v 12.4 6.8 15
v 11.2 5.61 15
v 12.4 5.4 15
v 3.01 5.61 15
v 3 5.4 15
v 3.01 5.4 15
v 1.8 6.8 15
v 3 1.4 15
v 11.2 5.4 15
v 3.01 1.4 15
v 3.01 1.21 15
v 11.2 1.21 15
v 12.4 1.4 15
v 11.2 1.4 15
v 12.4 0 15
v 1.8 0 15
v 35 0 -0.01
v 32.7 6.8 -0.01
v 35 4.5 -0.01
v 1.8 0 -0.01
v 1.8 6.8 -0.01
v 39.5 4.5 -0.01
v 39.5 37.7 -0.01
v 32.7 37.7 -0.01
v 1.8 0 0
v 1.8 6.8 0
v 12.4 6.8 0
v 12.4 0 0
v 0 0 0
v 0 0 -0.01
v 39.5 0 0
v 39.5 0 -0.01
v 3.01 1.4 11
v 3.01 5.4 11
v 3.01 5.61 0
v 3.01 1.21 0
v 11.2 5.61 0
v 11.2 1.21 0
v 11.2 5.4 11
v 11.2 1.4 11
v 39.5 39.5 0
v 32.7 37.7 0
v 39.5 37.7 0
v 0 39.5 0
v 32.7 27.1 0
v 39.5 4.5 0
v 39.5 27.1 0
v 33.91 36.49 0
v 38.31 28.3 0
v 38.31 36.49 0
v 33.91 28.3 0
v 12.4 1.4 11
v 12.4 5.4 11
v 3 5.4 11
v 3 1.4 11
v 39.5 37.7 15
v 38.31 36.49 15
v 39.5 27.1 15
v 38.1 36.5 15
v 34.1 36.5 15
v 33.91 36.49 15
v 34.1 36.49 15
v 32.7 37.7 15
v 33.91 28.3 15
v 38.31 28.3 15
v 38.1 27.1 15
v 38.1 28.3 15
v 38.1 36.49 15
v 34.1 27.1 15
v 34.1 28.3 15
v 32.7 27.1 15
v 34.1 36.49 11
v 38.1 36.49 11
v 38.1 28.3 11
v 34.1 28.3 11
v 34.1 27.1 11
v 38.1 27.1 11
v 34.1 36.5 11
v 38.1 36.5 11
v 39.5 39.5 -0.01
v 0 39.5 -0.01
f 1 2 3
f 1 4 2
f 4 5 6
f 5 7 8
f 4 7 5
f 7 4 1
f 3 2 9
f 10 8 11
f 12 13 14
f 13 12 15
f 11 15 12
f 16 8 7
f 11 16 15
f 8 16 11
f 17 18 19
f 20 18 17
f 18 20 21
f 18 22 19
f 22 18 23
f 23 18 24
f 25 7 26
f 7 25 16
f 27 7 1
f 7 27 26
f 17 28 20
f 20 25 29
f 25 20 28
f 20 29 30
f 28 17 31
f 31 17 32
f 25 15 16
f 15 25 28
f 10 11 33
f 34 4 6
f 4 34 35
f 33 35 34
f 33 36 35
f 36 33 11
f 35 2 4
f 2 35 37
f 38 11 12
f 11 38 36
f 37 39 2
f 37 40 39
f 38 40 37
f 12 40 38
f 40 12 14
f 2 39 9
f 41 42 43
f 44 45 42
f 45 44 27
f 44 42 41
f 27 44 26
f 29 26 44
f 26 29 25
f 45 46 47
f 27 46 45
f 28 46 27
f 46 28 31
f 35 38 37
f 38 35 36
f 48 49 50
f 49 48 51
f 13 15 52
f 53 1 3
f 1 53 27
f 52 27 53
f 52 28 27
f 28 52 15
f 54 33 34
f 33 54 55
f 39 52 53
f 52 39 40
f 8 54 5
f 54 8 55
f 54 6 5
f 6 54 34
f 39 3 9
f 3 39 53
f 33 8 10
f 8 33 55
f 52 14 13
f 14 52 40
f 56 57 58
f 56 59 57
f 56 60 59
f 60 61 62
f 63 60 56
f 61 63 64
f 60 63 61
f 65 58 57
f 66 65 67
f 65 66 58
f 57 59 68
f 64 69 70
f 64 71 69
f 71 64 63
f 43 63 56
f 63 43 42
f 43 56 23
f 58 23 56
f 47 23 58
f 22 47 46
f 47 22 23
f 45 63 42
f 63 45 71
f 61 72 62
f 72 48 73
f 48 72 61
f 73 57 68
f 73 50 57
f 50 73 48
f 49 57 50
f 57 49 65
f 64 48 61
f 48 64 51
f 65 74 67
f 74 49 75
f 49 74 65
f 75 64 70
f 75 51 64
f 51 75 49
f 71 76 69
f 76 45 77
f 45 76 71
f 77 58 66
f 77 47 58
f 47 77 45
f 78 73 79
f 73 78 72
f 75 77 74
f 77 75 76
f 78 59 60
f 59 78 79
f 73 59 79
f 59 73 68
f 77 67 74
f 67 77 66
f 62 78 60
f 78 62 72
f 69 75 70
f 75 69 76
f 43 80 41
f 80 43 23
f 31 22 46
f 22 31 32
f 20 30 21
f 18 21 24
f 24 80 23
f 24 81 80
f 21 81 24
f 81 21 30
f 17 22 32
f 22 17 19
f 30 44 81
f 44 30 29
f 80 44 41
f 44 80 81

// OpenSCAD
// file: ../Base/Boxes.scad
// Fischertechnik Box Foundation
// Pre-designed Boxes

use <Constants.scad>

include <PlacementOptions.scad>

box190Width = 190;
box190Depth = 130;
box130Width = 130;
box130Depth = 95;

// Values are from an original ec3 box
topBottomDifference = 1.5;
outerHeight = 40;
innerHeight = 38.2;
baseThickness = outerHeight - innerHeight;
stackExcess = 5.7;
radius = 3.5;
wallThickness = 1.5;
tolerance = 0.2;
stackOffset = innerHeight - stackExcess;

boxUsageHeight = stackOffset;
boxWallThickness = wallThickness;
boxBaseThickness = baseThickness;
boxWebWidth = 3.0;

// getBoxWallThickness()
// Gets the wall thickness of a Fischertechnik Box
function getBoxWallThickness() = boxWallThickness;

// getBoxUsageHeight()
// Gets the usable height of a Fischertechnik box
function getBoxUsageHeight() = boxUsageHeight;

// getBoxInnerHeight()
// Gets the inner height of a Fischertechnik box, including the stack excess
function getBoxInnerHeight() = innerHeight;

// getBoxBaseThickness()
// Gets the thickness of the Fischertechnik box base.
function getBoxBaseThickness() = boxBaseThickness;

// getBoxWebWidth()
// Gets the width of a box web
function getBoxWebWidth() = boxWebWidth;

// getBox190Space()
// Gets the usable inner space of a Box 190 as an x/y-list
function getBox190Space() = [
    box190Width - 2*getBoxWallThickness() - topBottomDifference, 
    box190Depth - 2*getBoxWallThickness() - topBottomDifference ];

// BoxBase(width, depth)
// Creates an empty stackable Fischertechnik compatible box
// width = Outer width of the box (190, 130, ...)
// depth = Outer depth of the box (130, 95, ...)

module BoxBase(width, depth, height=outerHeight) {    
    thinPlate = 0.01;

    innerHeight = height - baseThickness;    
    
    module BodyPlate(width, depth) {
        translate([radius, radius])
        hull() {
            w = width-2*radius;
            d = depth-2*radius;
            cube([w, d, thinPlate]);
            cylinder(thinPlate, r=radius, $fn=getFragments());
            translate([w, 0])
                cylinder(thinPlate, r=radius, $fn=getFragments());
            translate([w, d])
                cylinder(thinPlate, r=radius, $fn=getFragments());
            translate([0, d])
                cylinder(thinPlate, r=radius, $fn=getFragments());
        }
    }
    
    module Body(tolerance=tolerance) {
        hull() {
            // Bottom with tolerance to fit into the original boxes when stacked
            translate([-wallThickness+tolerance, -wallThickness+tolerance, -baseThickness])
                BodyPlate(width-topBottomDifference-2*tolerance, depth-topBottomDifference-2*tolerance);
            
            // Top
            translate([-wallThickness-topBottomDifference/2, -wallThickness-topBottomDifference/2, innerHeight-thinPlate])
                BodyPlate(width, depth);
         }
    }

    module Cutoff() {
        hull() {
            coWidth = width - 2*wallThickness;
            coDepth = depth - 2*wallThickness;
            
            // Bottom
            BodyPlate(coWidth-topBottomDifference, coDepth-topBottomDifference);

            // Top
            translate([-topBottomDifference/2, -topBottomDifference/2, innerHeight+thinPlate]) 
                BodyPlate(coWidth, coDepth);
        }
    }
    
    difference() {        
        Body();
        Cutoff();
        stackOffset = innerHeight - stackExcess;
        translate([0, 0, stackOffset + baseThickness])
            Body(tolerance=0);
    }
}

// Creates the Fischertechnik empty box 130x190 mm and places it at position 0,0
// 190x130 are the outer sizes, the inner space is slightly smaller. Use getBox190Space() to get the inner sizes.
// The box is positioned that the usable inner space is at the 0,0,0 position. The

module Box190() {
    BoxBase(box190Width, box190Depth);
}

// Gets the usable inner space of a Box 130 as an x/y-list
function getBox130Space() = [
    box130Width - 2*getBoxWallThickness() - topBottomDifference, 
    box130Depth - 2*getBoxWallThickness() - topBottomDifference ];

// Creates the Fischertechnik empty box 95x130 mm and places it at position 0,0
// 190x130 are the outer sizes, the inner space is slightly smaller. Use getBox190Space() to get the inner sizes.
// The box is positioned that the usable inner space is at the 0,0,0 position. The

module Box130() {
    BoxBase(box130Width, box130Depth);
}

// Creates a web at the specified box walls
// corner 0 = LowerLeft, 1 = UpperLeft, 2 = UpperRight, 3 = LowerRight
// side 0 = LeftOfCorner, 1 = RightOfCorner
// distance = Distance in mm from the corner
// boxSpace = inner width and depth of the box (default: Box 190)
// webWidth = length of the web (default is 3 mms)
// webThickness = thickness of the web (default is 1 mm)

module BoxWeb(corner, side, distance, boxSpace=getBox190Space(), webWidth=getBoxWebWidth(), webThickness=1.0) {
    sink = getBoxWallThickness()/2;

    width = (corner % 2 == 0) ? 
            (side == LeftOfCorner ? webWidth : webThickness) :
            (side == LeftOfCorner ? webThickness : webWidth);

    depth = (corner % 2 == 0) ? 
            (side == RightOfCorner ? webWidth : webThickness) :
            (side == RightOfCorner ? webThickness : webWidth);
    
    xDiff = corner == LowerLeft ? 
                (side == LeftOfCorner ? -sink : distance) :
            (corner == UpperLeft ?                
                (side == LeftOfCorner ? distance : -sink) :
            (corner == UpperRight ?
                (side == LeftOfCorner ? boxSpace.x-webWidth+sink : boxSpace.x-distance-webThickness) :
                (side == LeftOfCorner ? boxSpace.x-distance-webThickness: boxSpace.x-webWidth+sink)));

    yDiff = corner == LowerLeft ? 
                (side == RightOfCorner ? -sink : distance) :
            (corner == UpperLeft ?
                (side == RightOfCorner ? boxSpace.y-distance : boxSpace.y-webWidth+sink) :
            (corner == UpperRight ?
                (side == RightOfCorner ? boxSpace.y-webWidth+sink : boxSpace.y-distance) :
                (side == RightOfCorner ? distance : -sink)));
    
    translate([xDiff, yDiff, -getExcess()])
        cube([width, depth, boxUsageHeight + 2*getExcess()]);
}
// file: ../Base/Rotation.scad
// Fischertechnik Box Foundation
// Geometry Helpers Rotation

include <PlacementOptions.scad>

// getRotatedSpace(space, rotation=NoRotation)
// Rotates the space dependent on the specified rotation

function getRotatedSpace(space, rotation=NoRotation) = [
    (rotation == Rotate90 || rotation == Rotate270) ? space.y : space.x,
    (rotation == Rotate90 || rotation == Rotate270) ? space.x : space.y
];

// Rotates the given space around the fixed left lower corner
// space = the space the children needs as width/depth list [width,depth]
// rotation = 0 Rotate0 degrees, 1 Rotate90 degrees, 2 Rotate180 degrees, 3 Rotate270 degrees (equivalent to -90)

module RotateFix(space, rotation=NoRotation) {
    dy = (rotation == Rotate0 || rotation == Rotate270) ? 0 :
        (rotation == Rotate90) ? space.x :
        space.y;
    dx = (rotation < Rotate180) ? 0 :
        (rotation == Rotate180) ? space.x :
        space.y;
    
    translate([dx, dy, 0])
        rotate([0, 0, rotations[rotation]])
            children();
}
// file: ../Base/Alignment.scad
// Fischertechnik Box Foundation
// Geometry Helpers Alignment

include <PlacementOptions.scad>

// getAlignedX(elementWidth, spaceWidth, align=AlignRight, offset=0)
// Gets the aligned X offset of an element with the given
// width in the given space.
// elementWidth = The width of the element to positon
// spaceWidth = The space where the element should be aligned
// align = 0 AlignLeft, 1 AlignCenter, 2 AlignRight
// offset = an optional offset from the aligned position. When
// aligned left or centered, then positive values are in X direction.
// When aligned right then positive values are in negative X direction.

function getAlignedX(elementWidth, spaceWidth, align=AlignRight, offset=0) =
    (align == AlignLeft) ?
        offset :
        ((align == AlignCenter) ?
        (spaceWidth - elementWidth)/2 + offset :
        spaceWidth - offset - elementWidth);

// getAlignedY(elementDepth, spaceDepth, align=AlignTop, offset=0)
// Gets the aligned Y offset of an element with the given
// depth in the given space.
// elementDepth = The depth of the element to positon
// spaceDepth = The space where the element should be aligned
// align = 0 AlignBottom, 1 AlignCenter, 2 AlignTop
// offset = an optional offset from the aligned position. When
// aligned bottom or centered, then positive values are in Y direction.
// When aligned top then positive values are in negative Y direction.

function getAlignedY(elementDepth, spaceDepth, align=AlignTop, offset=0) =
    (align == AlignBottom) ?
        offset :
        ((align == AlignCenter) ?
        (spaceDepth - elementDepth)/2 + offset :
        spaceDepth - offset - elementDepth);
// file: ../Base/PlacementOptions.scad
// Fischertechnik Box Foundation
// Placement Options

// Alignment
NoAlign = 0;
AlignLeft = 1;
AlignBottom = 2;
AlignCenter = 3;
AlignRight = 4;
AlignTop = 5;

// Element rotation degree steps
rotations = [0, -90, -180, -270];

// Rotation
NoRotation = 0;
Rotate0 = 0;
Rotate90 = 1;
Rotate180 = 2;
Rotate270 = 3;

// Docking (seen from above)
NoDock = -1;
DockLeft = 0;
DockTop = 1;
DockRight = 2;
DockCorner = 2;
DockBottom = 3;

// Web corners
LowerLeft = 0;
UpperLeft = 1;
UpperRight = 2;
LowerRight = 3;

// Web position relative to corner
LeftOfCorner = 0;
RightOfCorner = 1;
// file: ../Base/Placement.scad
// Fischertechnik Box Foundation
// Geometry Helpers Placement

use <Constants.scad>
use <Alignment.scad>
use <Rotation.scad>
use <Boxes.scad>

include <PlacementOptions.scad>

// Place(x=0, y=0, elementSpace=[0,0], alignX=AlignLeft, alignY=AlignBottom, rotation=Rotate0, boxSpace=getBox190Space())
// Places the child at the specified position
// y = Y-Position. This is a relative position when an X aligment is specified.
// x = X-Position. This is a relative position when an Y aligment is specified.
// elementSpace = space of the element to be placed [x,y]
// alignX = -1=NoAlign, 0 AlignLeft, 1 AlignCenter, 3 AlignRight (elementSpace and boxSpace required!)
// alignY = -1=NoAlign, 2 AlignBottom, 1 AlignCenter, 4 AlignTop (elementSpace and boxSpace required!)
// rotation = 0 Rotate0 0 degrees, 1 Rotate90 90 degrees, 
// 2 Rotate180 180 degrees, 3 Rotate270 270 degrees (equivalent to -90)
// boxSpace = Inner space of the box where the placement occurs [x,y] - default is Box 190x130 inner space

module Place(x=0, y=0, elementSpace=[0,0], 
  alignX=AlignLeft, alignY=AlignBottom, 
  rotation=NoRotation, boxSpace=getBox190Space()) {

    module Position(x, y, space, rotation=Rotate0) {
        translate([x, y, 0])
            RotateFix(space, rotation)
                children();
    }

    space = getRotatedSpace(elementSpace, rotation);
    alignedX = getAlignedX(space.x, boxSpace.x, alignX, x);
    alignedY = getAlignedY(space.y, boxSpace.y, alignY, y);
    Position(alignedX, alignedY, elementSpace, rotation)
        children();
}

// Center(space=getBox130Space(), elementSpace=[0,0])
// space = Space where the children is centered. For cylinder use centered=true and no elementSpace.
// elementSpace = space of the element to be centered [x,y]

module Center(space=getBox190Space(), elementSpace=[0,0]) {
    Place(elementSpace=elementSpace, boxSpace=space, alignX=AlignCenter, alignY=AlignCenter)
        children();
}

// CenterHorizontal(width=0, y=0, offset=0, space=getBox130Space())
// width = Width of the element to be placed.
// y = Y position of the element
// offset = Offset from the center position (negative will be left of the center)
// space = Space where the element is placed

module CenterHorizontal(width=0, y=0, offset=0, space=getBox190Space()) {
    Place(x=offset, y=y, elementSpace=[width, 0], boxSpace=space, alignX=AlignCenter)
        children(0);
}

// CenterVertical(depth=0, x=0, offset=0, space=getBox130Space())
// depth = Depth of the element to be placed.
// x = X position of the element
// offset = Offset from the center position (negative will be down of the center)
// space = Space where the element is placed

module CenterVertical(depth=0, x=0, offset=0, space=getBox190Space()) {
    Place(x=x, y=offset, elementSpace=[0, depth], boxSpace=space, alignY=AlignCenter)
        children(0);
}

// getIsVertical(align)
// True if the specified alignment needs a vertical orientation for a divider (AlignRight, AlignLeft)

function getIsVertical(align) = (align == AlignRight || align == AlignLeft);

// getIsHorizontal(align)
// True if the specified alignment needs a horizontal orientation for a divider (AlignTop, AlignBottom)

function getIsHorizontal(align) = (align == AlignTop || align == AlignBottom);
// file: ../Base/Constants.scad
// Fischertechnik Box Foundation
// Constants

// Constant values necessary for multiple elements

// Base constants
dividerThickness = 1.2;
excess = 0.01;
fragments = 90;
tolerance = 0.8;

// Gets the thickness of a divider 
function getDividerThickness() = dividerThickness;

// Gets the excess that is used to merge walls into each other
function getExcess() = excess;

// Gets amount of fragments of a cylinder
function getFragments() = fragments;

// Gets the inner tolerance of a frame to each side
function getTolerance() = tolerance;


// Fischertechnik specific constants
axisDiameter = 4;
axisBottomDiameter = axisDiameter + 1;
standardEdgeDistance = 2.5;
standardWebDistance = 11.5;
standardCornerLength = 15;
tubeWallFactor = 0.8;
smallPartsFrameHeight = 20;

// Gets axis diameter
function getAxisDiameter() = axisDiameter;

// Gets axis bottom diameter for thicker part at the bottom
function getAxisBottomDiameter() = axisBottomDiameter;

// gets the standard distance to the wall of the box for dockable frames with webs
function getStandardEdgeDistance() = standardEdgeDistance;

// gets the standard distance of each web to the corner of the dockable frame
function getStandardWebDistance() = standardWebDistance;

// gets the standard length of the corner walls of a dockable frame
function getStandardCornerLength() = standardCornerLength;

// gets the wall thickness of a tube.
function getTubeWallThickness() = tubeWallFactor * getDividerThickness();

// gets the frame height for docked small parts boxes.
function getSmallPartsFrameHeight() = smallPartsFrameHeight;
// main file
// Fischertechnik Box Library
// Frame for Angle Axis
// 31035

use <../Base/Constants.scad>
use <../Base/Placement.scad>
use <../ModelBase/Simple.scad>
use <../ModelBase/Complex.scad>

include <../Base/PlacementOptions.scad>

width = 34.5;
depth = 34.5;
extra = 1.8;

function getFrameAngleAxisSpace(count=1) = getFrameOuterVolume([
    width + extra + (count-1)*(getFrameAxisSpace().y + extra), 
    depth + extra + (count-1)*(getFrameAxisSpace().y + extra), 
    getFrameAxisHeight()]);

module FrameAngleAxis(count=1) {
    Space(getFrameAngleAxisSpace(count));
    
    Place(x=extra)
        FrameAxis(single=true);
    
    spaceWithoutExtra = getFrameOuterVolume([
        width,
        depth,
        getFrameAxisHeight()
    ]);

    Place(
        elementSpace=[spaceWithoutExtra.x, getFrameAxisSpace().y], 
        boxSpace = getFrameAngleAxisSpace(),
        alignX = AlignRight,
        rotation = Rotate90)
        FrameAxis(single=true);
}

// Test
FrameAngleAxis();
